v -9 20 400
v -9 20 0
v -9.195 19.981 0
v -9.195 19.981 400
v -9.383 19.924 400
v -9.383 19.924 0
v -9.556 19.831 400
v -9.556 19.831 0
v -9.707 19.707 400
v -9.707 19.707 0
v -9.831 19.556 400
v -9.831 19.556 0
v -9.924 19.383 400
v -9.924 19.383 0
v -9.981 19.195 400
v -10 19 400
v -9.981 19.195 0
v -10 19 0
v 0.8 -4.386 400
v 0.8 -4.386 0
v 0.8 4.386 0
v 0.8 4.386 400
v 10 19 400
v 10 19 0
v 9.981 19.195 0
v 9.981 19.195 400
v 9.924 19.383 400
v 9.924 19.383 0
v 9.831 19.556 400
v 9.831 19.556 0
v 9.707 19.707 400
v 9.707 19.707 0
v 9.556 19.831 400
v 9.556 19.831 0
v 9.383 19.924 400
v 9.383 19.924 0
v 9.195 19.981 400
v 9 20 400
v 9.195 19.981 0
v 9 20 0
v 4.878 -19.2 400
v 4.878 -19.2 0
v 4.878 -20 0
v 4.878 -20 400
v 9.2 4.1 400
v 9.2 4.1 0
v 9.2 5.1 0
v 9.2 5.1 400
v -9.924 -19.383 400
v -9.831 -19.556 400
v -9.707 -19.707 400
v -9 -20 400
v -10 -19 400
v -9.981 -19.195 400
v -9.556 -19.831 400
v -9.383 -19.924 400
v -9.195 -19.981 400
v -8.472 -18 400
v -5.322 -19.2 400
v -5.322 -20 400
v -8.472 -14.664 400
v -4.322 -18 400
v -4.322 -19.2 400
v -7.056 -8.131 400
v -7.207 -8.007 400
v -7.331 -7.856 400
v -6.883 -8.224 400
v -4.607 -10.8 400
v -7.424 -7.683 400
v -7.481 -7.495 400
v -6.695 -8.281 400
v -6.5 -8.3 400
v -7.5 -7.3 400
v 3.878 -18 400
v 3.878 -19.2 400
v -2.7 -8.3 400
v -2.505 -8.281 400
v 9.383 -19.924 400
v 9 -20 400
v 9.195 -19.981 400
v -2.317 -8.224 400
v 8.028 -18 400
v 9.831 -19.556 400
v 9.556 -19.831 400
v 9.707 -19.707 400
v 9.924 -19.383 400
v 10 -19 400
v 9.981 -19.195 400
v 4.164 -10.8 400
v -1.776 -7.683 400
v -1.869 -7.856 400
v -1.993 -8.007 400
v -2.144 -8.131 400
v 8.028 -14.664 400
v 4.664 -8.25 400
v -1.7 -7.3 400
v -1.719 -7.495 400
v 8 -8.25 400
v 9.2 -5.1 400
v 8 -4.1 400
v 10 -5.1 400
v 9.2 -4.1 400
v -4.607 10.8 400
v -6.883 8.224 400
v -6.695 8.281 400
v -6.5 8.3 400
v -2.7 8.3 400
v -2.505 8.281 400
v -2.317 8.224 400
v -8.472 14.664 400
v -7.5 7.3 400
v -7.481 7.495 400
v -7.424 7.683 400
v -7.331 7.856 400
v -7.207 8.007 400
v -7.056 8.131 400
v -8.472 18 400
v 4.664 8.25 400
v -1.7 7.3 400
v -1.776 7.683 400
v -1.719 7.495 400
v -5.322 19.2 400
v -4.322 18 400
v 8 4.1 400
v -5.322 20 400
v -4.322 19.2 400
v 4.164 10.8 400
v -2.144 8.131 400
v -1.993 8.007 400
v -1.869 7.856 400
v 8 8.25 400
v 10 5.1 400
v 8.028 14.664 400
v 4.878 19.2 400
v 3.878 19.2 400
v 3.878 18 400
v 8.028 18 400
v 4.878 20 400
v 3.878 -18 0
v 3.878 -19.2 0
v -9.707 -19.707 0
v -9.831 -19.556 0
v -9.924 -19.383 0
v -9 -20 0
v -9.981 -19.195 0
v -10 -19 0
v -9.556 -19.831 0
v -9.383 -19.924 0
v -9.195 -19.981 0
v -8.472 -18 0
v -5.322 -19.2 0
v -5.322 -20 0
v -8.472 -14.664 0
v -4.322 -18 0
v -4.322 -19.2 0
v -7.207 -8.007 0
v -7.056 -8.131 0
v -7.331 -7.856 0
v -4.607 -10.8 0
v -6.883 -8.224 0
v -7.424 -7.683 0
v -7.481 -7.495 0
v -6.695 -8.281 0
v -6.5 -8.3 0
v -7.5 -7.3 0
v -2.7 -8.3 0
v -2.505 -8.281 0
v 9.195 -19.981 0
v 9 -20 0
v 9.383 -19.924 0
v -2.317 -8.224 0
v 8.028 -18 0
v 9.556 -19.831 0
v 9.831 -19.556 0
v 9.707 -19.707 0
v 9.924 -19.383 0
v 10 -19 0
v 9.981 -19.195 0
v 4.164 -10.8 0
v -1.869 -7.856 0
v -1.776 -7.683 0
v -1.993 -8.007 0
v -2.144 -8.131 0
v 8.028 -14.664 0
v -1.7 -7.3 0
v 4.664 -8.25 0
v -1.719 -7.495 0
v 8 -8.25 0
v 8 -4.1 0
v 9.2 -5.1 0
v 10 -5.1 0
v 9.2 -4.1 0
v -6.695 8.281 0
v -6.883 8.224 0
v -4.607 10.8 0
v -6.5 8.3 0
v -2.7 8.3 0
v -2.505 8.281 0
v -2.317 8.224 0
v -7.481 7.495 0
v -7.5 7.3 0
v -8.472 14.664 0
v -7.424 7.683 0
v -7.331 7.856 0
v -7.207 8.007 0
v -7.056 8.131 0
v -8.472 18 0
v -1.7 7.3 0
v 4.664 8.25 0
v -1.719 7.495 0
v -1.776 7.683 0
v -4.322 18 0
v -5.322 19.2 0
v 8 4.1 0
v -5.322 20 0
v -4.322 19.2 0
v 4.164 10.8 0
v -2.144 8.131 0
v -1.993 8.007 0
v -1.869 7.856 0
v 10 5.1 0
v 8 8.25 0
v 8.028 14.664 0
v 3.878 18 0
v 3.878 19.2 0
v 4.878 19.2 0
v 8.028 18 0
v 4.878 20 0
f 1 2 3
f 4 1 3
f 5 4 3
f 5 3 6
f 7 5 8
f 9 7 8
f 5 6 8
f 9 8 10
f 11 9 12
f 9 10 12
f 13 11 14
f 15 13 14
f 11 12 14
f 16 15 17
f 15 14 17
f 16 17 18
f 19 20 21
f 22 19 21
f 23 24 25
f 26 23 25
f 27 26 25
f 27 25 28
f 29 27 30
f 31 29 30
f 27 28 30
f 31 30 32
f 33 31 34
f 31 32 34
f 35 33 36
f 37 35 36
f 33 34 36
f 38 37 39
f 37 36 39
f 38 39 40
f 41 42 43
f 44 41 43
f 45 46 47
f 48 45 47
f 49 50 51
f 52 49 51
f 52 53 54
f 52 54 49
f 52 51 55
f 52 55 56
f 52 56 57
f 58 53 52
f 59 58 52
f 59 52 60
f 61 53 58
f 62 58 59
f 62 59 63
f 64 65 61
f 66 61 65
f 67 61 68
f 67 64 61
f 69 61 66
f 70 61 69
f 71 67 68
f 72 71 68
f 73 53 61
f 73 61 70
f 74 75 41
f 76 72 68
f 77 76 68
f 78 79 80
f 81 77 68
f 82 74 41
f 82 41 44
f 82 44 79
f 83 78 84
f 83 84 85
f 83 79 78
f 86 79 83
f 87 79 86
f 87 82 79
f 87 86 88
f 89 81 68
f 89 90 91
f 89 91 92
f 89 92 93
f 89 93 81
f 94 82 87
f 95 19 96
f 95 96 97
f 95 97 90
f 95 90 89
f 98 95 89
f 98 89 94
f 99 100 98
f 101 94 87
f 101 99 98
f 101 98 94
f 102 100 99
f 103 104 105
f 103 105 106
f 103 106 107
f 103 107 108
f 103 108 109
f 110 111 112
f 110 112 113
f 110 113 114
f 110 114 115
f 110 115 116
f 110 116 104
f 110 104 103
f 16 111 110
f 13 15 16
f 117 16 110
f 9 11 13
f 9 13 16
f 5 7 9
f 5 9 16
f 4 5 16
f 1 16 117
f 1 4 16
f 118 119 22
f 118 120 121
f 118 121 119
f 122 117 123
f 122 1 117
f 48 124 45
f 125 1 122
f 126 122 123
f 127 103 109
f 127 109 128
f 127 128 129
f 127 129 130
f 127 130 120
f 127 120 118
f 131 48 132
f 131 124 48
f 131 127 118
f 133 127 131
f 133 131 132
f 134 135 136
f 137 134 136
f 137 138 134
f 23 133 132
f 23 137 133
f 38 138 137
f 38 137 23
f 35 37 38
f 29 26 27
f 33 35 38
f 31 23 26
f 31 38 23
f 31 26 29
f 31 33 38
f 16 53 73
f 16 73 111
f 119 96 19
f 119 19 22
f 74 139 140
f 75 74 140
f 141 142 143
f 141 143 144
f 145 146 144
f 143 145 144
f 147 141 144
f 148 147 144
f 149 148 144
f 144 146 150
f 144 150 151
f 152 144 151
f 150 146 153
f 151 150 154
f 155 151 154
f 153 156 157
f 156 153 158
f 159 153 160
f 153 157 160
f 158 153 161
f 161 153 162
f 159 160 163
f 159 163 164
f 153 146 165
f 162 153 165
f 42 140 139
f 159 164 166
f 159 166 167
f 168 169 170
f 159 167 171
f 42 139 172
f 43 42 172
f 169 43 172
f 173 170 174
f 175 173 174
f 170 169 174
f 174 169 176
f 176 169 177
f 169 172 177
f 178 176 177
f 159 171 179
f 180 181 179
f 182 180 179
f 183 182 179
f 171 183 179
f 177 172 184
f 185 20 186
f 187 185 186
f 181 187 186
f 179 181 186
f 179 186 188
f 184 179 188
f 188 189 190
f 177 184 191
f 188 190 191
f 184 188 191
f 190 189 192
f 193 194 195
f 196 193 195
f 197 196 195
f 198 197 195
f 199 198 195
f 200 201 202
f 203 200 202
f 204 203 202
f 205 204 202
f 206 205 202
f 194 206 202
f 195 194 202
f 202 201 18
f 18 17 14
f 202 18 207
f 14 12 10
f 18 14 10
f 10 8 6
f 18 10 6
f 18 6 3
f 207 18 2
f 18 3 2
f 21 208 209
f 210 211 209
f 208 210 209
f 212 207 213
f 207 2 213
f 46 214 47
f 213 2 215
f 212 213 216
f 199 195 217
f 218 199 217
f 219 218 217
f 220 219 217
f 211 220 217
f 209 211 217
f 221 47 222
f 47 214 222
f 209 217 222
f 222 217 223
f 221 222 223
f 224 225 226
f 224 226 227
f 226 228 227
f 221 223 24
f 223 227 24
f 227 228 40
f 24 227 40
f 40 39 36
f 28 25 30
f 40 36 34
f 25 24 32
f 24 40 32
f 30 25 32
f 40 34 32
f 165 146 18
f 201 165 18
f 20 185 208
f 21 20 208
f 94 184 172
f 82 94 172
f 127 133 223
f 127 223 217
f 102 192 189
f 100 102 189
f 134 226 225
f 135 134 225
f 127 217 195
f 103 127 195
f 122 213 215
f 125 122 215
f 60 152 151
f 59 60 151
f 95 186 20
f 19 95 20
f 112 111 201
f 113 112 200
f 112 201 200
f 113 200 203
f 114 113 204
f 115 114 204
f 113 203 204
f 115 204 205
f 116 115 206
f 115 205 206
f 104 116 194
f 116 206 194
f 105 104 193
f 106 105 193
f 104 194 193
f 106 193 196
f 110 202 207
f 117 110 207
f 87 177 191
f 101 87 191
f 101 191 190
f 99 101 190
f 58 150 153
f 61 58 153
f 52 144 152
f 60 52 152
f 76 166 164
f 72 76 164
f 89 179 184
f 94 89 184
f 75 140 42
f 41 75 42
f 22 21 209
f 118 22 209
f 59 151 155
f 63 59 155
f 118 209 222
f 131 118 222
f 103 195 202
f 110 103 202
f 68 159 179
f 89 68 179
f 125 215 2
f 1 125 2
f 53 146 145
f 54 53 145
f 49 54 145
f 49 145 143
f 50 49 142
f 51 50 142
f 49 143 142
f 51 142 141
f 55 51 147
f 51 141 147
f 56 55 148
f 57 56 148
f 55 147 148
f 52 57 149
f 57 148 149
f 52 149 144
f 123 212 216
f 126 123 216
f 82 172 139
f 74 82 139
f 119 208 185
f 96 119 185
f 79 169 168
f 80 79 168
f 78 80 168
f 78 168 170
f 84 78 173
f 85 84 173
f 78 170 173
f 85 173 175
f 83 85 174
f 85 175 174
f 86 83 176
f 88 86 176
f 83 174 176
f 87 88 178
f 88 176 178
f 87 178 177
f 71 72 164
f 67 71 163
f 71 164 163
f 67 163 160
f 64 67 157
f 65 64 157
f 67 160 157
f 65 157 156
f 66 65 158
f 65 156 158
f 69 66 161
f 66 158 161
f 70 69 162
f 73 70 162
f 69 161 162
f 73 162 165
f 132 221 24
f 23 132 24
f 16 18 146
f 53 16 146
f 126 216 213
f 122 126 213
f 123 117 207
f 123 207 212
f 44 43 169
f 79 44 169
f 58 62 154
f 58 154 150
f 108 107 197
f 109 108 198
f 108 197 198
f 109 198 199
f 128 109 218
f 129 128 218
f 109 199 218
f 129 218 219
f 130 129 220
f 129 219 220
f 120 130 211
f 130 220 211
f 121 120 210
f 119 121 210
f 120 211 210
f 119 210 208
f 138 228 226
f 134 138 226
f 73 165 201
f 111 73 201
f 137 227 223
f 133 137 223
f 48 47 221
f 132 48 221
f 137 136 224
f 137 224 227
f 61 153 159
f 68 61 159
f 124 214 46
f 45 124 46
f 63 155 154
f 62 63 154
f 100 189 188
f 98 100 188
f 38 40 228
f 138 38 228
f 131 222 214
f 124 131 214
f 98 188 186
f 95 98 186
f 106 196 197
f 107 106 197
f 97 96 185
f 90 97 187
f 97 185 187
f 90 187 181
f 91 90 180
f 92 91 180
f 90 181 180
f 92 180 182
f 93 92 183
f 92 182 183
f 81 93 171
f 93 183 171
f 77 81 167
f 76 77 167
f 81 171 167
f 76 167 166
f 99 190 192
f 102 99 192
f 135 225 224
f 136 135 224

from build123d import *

# Parameters (mm, degrees)
EXTRUDE_3_DEPTH = 400


with BuildPart() as part:
    # 草图30 → 凸台-拉伸3 (new body)
    with BuildSketch(Plane.XY):
        with BuildLine():
            Line((0.8, 4.385786438), (4.664213562, 8.25))
            Line((4.664213562, 8.25), (8, 8.25))
            Line((8, 8.25), (8, 4.1))
            Line((8, 4.1), (9.2, 4.1))
            Line((9.2, 4.1), (9.2, 5.1))
            Line((9.2, 5.1), (10, 5.1))
            Line((10, 5.1), (10, 19))
            ThreePointArc((10, 19), (9.707106781, 19.707106781), (9, 20))
            Line((9, 20), (4.878384215, 20))
            Line((4.878384215, 20), (4.878384215, 19.2))
            Line((4.878384215, 19.2), (3.878384215, 19.2))
            Line((3.878384215, 19.2), (3.878384215, 18))
            Line((3.878384215, 18), (8.028384215, 18))
            Line((8.028384215, 18), (8.028384215, 14.664213562))
            Line((8.028384215, 14.664213562), (4.164170652, 10.8))
            Line((4.164170652, 10.8), (-4.607402223, 10.8))
            Line((-4.607402223, 10.8), (-8.471615785, 14.664213562))
            Line((-8.471615785, 14.664213562), (-8.471615785, 18))
            Line((-8.471615785, 18), (-4.321615785, 18))
            Line((-4.321615785, 18), (-4.321615785, 19.2))
            Line((-4.321615785, 19.2), (-5.321615785, 19.2))
            Line((-5.321615785, 19.2), (-5.321615785, 20))
            Line((-5.321615785, 20), (-9, 20))
            ThreePointArc((-9, 20), (-9.707106781, 19.707106781), (-10, 19))
            Line((-10, 19), (-10, -19))
            ThreePointArc((-10, -19), (-9.707106781, -19.707106781), (-9, -20))
            Line((-9, -20), (-5.321615785, -20))
            Line((-5.321615785, -20), (-5.321615785, -19.2))
            Line((-5.321615785, -19.2), (-4.321615785, -19.2))
            Line((-4.321615785, -19.2), (-4.321615785, -18))
            Line((-4.321615785, -18), (-8.471615785, -18))
            Line((-8.471615785, -18), (-8.471615785, -14.664213562))
            Line((-8.471615785, -14.664213562), (-4.607402223, -10.8))
            Line((-4.607402223, -10.8), (4.164170652, -10.8))
            Line((4.164170652, -10.8), (8.028384215, -14.664213562))
            Line((8.028384215, -14.664213562), (8.028384215, -18))
            Line((8.028384215, -18), (3.878384215, -18))
            Line((3.878384215, -18), (3.878384215, -19.2))
            Line((3.878384215, -19.2), (4.878384215, -19.2))
            Line((4.878384215, -19.2), (4.878384215, -20))
            Line((4.878384215, -20), (9, -20))
            ThreePointArc((9, -20), (9.707106781, -19.707106781), (10, -19))
            Line((10, -19), (10, -5.1))
            Line((10, -5.1), (9.2, -5.1))
            Line((9.2, -5.1), (9.2, -4.1))
            Line((9.2, -4.1), (8, -4.1))
            Line((8, -4.1), (8, -8.25))
            Line((8, -8.25), (4.664213562, -8.25))
            Line((4.664213562, -8.25), (0.8, -4.385786438))
            Line((0.8, -4.385786438), (0.8, 4.385786438))
        make_face()
        with BuildLine():
            Line((-1.7, 7.3), (-1.7, -7.3))
            ThreePointArc((-1.7, -7.3), (-1.992893219, -8.007106781), (-2.7, -8.3))
            Line((-2.7, -8.3), (-6.5, -8.3))
            ThreePointArc((-6.5, -8.3), (-7.207106781, -8.007106781), (-7.5, -7.3))
            Line((-7.5, -7.3), (-7.5, 7.3))
            ThreePointArc((-7.5, 7.3), (-7.207106781, 8.007106781), (-6.5, 8.3))
            Line((-6.5, 8.3), (-2.7, 8.3))
            ThreePointArc((-2.7, 8.3), (-1.992893219, 8.007106781), (-1.7, 7.3))
        make_face(mode=Mode.SUBTRACT)
    extrude(amount=EXTRUDE_3_DEPTH)


solid = part.part
